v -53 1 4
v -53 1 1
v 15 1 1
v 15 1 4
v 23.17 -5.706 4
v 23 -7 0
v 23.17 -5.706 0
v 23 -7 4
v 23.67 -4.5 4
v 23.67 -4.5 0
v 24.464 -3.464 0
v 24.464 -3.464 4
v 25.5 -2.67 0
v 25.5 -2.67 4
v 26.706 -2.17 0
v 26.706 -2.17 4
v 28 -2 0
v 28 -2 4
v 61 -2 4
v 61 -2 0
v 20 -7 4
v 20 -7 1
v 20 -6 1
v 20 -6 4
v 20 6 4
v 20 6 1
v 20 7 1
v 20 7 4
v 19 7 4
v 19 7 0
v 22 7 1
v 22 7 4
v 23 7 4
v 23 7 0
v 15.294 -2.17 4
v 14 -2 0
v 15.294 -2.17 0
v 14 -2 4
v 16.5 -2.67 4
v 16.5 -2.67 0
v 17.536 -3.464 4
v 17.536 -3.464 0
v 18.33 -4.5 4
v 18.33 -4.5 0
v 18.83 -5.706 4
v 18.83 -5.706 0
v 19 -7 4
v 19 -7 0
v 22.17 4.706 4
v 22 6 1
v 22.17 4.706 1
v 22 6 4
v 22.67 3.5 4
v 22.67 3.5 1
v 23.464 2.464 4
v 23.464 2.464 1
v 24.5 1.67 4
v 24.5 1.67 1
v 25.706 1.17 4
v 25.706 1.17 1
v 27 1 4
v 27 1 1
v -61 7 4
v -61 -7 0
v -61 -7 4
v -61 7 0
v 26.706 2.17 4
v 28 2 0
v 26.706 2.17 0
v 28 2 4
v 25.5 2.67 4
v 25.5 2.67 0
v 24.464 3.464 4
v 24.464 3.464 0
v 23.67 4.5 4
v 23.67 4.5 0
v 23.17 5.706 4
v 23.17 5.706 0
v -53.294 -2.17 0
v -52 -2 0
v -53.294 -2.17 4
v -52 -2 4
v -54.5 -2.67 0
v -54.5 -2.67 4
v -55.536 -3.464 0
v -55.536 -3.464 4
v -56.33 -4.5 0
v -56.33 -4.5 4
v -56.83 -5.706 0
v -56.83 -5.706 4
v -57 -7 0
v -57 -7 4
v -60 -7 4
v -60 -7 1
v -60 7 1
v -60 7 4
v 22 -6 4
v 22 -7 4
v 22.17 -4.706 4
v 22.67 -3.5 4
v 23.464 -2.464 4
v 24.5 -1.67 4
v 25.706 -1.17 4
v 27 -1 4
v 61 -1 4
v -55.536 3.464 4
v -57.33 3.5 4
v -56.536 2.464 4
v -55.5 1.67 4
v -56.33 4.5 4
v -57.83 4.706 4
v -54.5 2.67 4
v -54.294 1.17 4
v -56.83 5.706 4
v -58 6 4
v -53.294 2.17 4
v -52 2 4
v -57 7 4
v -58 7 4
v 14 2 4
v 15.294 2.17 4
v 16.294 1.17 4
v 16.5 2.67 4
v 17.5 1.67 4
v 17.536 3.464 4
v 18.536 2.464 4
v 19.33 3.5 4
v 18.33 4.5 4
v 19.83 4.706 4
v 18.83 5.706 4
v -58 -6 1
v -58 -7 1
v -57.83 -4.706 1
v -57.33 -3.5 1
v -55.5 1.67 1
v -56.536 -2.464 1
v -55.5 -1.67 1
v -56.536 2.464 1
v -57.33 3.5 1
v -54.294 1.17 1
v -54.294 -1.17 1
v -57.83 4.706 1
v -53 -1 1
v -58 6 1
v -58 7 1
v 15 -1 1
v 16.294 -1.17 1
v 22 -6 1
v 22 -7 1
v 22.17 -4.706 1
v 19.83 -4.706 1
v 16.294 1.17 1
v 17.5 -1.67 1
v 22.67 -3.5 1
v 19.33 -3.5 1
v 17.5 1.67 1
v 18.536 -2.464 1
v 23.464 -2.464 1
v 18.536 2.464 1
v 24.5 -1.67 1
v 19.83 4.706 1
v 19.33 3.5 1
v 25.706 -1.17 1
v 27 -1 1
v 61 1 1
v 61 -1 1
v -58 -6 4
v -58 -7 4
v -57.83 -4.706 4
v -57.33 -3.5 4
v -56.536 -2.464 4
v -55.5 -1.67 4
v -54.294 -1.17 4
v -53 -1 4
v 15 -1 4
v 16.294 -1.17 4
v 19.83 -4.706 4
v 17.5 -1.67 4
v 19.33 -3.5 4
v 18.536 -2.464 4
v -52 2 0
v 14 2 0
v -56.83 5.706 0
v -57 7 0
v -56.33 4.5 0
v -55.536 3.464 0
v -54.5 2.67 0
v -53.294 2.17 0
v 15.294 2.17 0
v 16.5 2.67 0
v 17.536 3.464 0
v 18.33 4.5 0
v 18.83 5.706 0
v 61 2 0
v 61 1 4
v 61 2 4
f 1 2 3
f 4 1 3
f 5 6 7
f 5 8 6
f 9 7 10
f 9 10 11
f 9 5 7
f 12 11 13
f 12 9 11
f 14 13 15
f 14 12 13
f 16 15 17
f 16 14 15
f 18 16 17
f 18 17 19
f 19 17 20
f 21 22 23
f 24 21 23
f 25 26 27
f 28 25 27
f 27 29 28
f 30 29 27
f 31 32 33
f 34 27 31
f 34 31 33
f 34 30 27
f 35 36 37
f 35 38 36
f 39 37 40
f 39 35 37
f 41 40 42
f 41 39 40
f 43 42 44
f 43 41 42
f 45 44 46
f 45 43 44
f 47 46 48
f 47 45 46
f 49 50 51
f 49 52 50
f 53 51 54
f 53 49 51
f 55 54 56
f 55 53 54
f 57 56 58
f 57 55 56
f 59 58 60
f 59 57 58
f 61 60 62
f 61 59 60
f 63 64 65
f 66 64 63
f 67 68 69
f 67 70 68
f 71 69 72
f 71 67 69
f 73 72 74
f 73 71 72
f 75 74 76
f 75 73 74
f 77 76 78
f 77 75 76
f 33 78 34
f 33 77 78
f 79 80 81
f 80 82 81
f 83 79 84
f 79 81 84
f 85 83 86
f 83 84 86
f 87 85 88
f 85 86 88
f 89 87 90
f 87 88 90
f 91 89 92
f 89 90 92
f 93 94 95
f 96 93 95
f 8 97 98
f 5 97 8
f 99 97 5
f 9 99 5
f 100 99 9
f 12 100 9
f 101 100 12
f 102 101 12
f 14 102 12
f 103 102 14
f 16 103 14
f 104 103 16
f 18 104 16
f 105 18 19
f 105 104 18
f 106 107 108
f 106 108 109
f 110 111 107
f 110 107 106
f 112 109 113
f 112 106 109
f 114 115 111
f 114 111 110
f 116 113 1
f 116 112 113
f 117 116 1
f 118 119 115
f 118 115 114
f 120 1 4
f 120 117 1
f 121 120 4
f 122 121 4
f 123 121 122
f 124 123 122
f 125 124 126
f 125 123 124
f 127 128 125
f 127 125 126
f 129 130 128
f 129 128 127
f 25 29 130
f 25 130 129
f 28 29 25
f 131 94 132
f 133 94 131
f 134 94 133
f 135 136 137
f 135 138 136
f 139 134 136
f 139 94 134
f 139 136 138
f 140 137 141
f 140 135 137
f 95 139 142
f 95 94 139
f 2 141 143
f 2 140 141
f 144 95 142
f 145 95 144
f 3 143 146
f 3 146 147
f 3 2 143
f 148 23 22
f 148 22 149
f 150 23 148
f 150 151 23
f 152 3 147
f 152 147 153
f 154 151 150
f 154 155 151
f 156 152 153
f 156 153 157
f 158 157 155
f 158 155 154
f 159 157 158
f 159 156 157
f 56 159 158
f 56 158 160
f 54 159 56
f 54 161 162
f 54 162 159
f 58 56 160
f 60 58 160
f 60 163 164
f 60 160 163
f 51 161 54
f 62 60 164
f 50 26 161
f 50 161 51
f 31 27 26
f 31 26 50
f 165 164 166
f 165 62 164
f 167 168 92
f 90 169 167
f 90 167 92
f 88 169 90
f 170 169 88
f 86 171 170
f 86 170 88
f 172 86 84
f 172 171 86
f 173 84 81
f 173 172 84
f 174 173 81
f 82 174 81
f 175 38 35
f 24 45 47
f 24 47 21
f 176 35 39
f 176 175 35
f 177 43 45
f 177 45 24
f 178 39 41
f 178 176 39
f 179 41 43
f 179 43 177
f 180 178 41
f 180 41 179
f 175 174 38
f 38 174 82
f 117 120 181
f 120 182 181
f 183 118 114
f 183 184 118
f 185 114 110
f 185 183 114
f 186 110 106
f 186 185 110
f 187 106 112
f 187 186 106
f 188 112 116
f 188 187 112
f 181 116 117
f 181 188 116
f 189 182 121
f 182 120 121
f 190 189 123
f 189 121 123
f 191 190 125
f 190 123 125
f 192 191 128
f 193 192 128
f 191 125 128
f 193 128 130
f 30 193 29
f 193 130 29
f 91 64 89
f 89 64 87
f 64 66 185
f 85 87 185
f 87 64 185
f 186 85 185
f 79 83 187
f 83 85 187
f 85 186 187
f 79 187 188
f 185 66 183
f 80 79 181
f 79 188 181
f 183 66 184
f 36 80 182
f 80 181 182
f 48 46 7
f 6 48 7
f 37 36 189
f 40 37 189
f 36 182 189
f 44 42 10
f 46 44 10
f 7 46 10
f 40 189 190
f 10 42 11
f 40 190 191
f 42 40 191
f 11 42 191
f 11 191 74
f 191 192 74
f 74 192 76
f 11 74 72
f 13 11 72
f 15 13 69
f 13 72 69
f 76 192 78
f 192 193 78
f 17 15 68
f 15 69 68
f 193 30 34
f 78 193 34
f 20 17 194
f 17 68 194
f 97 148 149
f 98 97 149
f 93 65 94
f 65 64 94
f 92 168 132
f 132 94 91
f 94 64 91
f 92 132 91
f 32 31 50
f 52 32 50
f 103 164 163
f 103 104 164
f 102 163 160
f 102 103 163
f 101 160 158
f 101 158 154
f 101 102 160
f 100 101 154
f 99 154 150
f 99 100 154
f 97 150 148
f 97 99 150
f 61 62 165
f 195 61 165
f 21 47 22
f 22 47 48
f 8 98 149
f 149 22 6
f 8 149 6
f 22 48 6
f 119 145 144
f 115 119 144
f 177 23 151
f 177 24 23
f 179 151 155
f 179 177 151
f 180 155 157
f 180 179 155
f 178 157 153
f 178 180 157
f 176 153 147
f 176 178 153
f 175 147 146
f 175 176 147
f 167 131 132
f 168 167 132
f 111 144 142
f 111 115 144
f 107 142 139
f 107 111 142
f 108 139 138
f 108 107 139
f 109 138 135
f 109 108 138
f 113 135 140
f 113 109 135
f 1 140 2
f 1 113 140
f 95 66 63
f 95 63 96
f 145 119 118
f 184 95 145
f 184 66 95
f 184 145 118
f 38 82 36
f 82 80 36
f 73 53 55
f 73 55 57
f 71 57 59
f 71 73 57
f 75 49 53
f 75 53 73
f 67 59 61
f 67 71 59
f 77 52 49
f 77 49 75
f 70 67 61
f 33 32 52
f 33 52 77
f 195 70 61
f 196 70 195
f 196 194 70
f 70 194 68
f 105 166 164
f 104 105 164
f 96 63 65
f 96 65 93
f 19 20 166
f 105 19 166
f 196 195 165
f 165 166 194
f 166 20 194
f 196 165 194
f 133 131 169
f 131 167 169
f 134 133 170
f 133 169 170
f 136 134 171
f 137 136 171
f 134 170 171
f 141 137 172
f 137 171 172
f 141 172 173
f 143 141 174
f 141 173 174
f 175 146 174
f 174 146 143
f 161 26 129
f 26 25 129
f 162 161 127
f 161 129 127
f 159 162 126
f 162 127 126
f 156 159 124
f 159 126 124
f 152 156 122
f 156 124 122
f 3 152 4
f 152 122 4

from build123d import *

# Parameters (mm, degrees)
F0_W     = 4
F0_H     = 5
F0_W_2   = 76
F0_H_2   = 2
F1_DEPTH = 1
F2_W     = 1
F2_H     = 14
F2_W_2   = 6
F2_H_2   = 1
F2_W_3   = 5
F2_W_4   = 33
F2_W_5   = 65
F3_DEPTH = 3
F4_R     = 4.99999
F5_R     = 4.99999


# Not quite as in the source:
# - a fillet or chamfer is up to 0.001 mm smaller than in the source, because OpenCascade refuses the exact size


with BuildPart() as f1:
    # F0 (on Top) → F1 (new body)
    with BuildSketch(Plane.XY):
        with Locations((-59, 4.5)):
            Rectangle(F0_W, F0_H)
        with Locations((-19, -1)):
            Rectangle(F0_W_2, F0_H_2)
        with Locations((-19, 1)):
            Rectangle(F0_W_2, F0_H_2)
        with Locations((-59, -1)):
            Rectangle(F0_W, F0_H_2)
        with Locations((-59, 1)):
            Rectangle(F0_W, F0_H_2)
        with Locations((-59, -4.5)):
            Rectangle(F0_W, F0_H)
        Polygon((61, 2), (23, 2), (23, 0), (23, -2), (61, -2), align=None)
        with Locations((21, 1)):
            Rectangle(F0_W, F0_H_2)
        with Locations((21, -1)):
            Rectangle(F0_W, F0_H_2)
        with Locations((21, 4.5)):
            Rectangle(F0_W, F0_H)
        with Locations((21, -4.5)):
            Rectangle(F0_W, F0_H)
    extrude(amount=F1_DEPTH)

    # F2 (on face) → F3 (join)
    with BuildSketch(Plane.XY.offset(1)):
        with Locations((-60.5, 0)):
            Rectangle(F2_W, F2_H)
        Polygon((-57, 7), (-58, 7), (-58, 1), (-57, 1), (-57, 2), align=None)
        with Locations((-54, 1.5)):
            Rectangle(F2_W_2, F2_H_2)
        with Locations((-54, -1.5)):
            Rectangle(F2_W_2, F2_H_2)
        Polygon((-58, -1), (-58, -7), (-57, -7), (-57, -2), (-57, -1), align=None)
        Polygon((19, -1), (19, -2), (19, -7), (20, -7), (20, -1), align=None)
        Polygon((19, 7), (19, 2), (19, 1), (20, 1), (20, 7), align=None)
        with Locations((16.5, 1.5)):
            Rectangle(F2_W_3, F2_H_2)
        with Locations((16.5, -1.5)):
            Rectangle(F2_W_3, F2_H_2)
        with Locations((25.5, -1.5)):
            Rectangle(F2_W_3, F2_H_2)
        with Locations((25.5, 1.5)):
            Rectangle(F2_W_3, F2_H_2)
        Polygon((23, 7), (22, 7), (22, 1), (23, 1), (23, 2), align=None)
        Polygon((22, -1), (22, -7), (23, -7), (23, -2), (23, -1), align=None)
        with Locations((44.5, -1.5)):
            Rectangle(F2_W_4, F2_H_2)
        with Locations((-18.5, 1.5)):
            Rectangle(F2_W_5, F2_H_2)
        with Locations((-18.5, -1.5)):
            Rectangle(F2_W_5, F2_H_2)
        with Locations((44.5, 1.5)):
            Rectangle(F2_W_4, F2_H_2)
    extrude(amount=F3_DEPTH)

    # F4 (radius 5 in the source; OpenCascade refuses exactly that, so slightly less here)
    f4_edges = [f1.edges().sort_by_distance(p)[0] for p in [
        (23, -2, 2),
        (20, -1, 2.5),
        (20, 1, 2.5),
        (22, 1, 2.5),
        (19, -2, 2),
        (22, -1, 2.5),
        (19, 2, 2),
        (23, 2, 2),
    ]]
    fillet(f4_edges, radius=F4_R)

    # F5 (radius 5 in the source; OpenCascade refuses exactly that, so slightly less here)
    f5_edges = [f1.edges().sort_by_distance(p)[0] for p in [
        (-57, -2, 2),
        (-58, 1, 2.5),
        (-57, 2, 2),
        (-58, -1, 2.5),
    ]]
    fillet(f5_edges, radius=F5_R)


solid = f1.part
